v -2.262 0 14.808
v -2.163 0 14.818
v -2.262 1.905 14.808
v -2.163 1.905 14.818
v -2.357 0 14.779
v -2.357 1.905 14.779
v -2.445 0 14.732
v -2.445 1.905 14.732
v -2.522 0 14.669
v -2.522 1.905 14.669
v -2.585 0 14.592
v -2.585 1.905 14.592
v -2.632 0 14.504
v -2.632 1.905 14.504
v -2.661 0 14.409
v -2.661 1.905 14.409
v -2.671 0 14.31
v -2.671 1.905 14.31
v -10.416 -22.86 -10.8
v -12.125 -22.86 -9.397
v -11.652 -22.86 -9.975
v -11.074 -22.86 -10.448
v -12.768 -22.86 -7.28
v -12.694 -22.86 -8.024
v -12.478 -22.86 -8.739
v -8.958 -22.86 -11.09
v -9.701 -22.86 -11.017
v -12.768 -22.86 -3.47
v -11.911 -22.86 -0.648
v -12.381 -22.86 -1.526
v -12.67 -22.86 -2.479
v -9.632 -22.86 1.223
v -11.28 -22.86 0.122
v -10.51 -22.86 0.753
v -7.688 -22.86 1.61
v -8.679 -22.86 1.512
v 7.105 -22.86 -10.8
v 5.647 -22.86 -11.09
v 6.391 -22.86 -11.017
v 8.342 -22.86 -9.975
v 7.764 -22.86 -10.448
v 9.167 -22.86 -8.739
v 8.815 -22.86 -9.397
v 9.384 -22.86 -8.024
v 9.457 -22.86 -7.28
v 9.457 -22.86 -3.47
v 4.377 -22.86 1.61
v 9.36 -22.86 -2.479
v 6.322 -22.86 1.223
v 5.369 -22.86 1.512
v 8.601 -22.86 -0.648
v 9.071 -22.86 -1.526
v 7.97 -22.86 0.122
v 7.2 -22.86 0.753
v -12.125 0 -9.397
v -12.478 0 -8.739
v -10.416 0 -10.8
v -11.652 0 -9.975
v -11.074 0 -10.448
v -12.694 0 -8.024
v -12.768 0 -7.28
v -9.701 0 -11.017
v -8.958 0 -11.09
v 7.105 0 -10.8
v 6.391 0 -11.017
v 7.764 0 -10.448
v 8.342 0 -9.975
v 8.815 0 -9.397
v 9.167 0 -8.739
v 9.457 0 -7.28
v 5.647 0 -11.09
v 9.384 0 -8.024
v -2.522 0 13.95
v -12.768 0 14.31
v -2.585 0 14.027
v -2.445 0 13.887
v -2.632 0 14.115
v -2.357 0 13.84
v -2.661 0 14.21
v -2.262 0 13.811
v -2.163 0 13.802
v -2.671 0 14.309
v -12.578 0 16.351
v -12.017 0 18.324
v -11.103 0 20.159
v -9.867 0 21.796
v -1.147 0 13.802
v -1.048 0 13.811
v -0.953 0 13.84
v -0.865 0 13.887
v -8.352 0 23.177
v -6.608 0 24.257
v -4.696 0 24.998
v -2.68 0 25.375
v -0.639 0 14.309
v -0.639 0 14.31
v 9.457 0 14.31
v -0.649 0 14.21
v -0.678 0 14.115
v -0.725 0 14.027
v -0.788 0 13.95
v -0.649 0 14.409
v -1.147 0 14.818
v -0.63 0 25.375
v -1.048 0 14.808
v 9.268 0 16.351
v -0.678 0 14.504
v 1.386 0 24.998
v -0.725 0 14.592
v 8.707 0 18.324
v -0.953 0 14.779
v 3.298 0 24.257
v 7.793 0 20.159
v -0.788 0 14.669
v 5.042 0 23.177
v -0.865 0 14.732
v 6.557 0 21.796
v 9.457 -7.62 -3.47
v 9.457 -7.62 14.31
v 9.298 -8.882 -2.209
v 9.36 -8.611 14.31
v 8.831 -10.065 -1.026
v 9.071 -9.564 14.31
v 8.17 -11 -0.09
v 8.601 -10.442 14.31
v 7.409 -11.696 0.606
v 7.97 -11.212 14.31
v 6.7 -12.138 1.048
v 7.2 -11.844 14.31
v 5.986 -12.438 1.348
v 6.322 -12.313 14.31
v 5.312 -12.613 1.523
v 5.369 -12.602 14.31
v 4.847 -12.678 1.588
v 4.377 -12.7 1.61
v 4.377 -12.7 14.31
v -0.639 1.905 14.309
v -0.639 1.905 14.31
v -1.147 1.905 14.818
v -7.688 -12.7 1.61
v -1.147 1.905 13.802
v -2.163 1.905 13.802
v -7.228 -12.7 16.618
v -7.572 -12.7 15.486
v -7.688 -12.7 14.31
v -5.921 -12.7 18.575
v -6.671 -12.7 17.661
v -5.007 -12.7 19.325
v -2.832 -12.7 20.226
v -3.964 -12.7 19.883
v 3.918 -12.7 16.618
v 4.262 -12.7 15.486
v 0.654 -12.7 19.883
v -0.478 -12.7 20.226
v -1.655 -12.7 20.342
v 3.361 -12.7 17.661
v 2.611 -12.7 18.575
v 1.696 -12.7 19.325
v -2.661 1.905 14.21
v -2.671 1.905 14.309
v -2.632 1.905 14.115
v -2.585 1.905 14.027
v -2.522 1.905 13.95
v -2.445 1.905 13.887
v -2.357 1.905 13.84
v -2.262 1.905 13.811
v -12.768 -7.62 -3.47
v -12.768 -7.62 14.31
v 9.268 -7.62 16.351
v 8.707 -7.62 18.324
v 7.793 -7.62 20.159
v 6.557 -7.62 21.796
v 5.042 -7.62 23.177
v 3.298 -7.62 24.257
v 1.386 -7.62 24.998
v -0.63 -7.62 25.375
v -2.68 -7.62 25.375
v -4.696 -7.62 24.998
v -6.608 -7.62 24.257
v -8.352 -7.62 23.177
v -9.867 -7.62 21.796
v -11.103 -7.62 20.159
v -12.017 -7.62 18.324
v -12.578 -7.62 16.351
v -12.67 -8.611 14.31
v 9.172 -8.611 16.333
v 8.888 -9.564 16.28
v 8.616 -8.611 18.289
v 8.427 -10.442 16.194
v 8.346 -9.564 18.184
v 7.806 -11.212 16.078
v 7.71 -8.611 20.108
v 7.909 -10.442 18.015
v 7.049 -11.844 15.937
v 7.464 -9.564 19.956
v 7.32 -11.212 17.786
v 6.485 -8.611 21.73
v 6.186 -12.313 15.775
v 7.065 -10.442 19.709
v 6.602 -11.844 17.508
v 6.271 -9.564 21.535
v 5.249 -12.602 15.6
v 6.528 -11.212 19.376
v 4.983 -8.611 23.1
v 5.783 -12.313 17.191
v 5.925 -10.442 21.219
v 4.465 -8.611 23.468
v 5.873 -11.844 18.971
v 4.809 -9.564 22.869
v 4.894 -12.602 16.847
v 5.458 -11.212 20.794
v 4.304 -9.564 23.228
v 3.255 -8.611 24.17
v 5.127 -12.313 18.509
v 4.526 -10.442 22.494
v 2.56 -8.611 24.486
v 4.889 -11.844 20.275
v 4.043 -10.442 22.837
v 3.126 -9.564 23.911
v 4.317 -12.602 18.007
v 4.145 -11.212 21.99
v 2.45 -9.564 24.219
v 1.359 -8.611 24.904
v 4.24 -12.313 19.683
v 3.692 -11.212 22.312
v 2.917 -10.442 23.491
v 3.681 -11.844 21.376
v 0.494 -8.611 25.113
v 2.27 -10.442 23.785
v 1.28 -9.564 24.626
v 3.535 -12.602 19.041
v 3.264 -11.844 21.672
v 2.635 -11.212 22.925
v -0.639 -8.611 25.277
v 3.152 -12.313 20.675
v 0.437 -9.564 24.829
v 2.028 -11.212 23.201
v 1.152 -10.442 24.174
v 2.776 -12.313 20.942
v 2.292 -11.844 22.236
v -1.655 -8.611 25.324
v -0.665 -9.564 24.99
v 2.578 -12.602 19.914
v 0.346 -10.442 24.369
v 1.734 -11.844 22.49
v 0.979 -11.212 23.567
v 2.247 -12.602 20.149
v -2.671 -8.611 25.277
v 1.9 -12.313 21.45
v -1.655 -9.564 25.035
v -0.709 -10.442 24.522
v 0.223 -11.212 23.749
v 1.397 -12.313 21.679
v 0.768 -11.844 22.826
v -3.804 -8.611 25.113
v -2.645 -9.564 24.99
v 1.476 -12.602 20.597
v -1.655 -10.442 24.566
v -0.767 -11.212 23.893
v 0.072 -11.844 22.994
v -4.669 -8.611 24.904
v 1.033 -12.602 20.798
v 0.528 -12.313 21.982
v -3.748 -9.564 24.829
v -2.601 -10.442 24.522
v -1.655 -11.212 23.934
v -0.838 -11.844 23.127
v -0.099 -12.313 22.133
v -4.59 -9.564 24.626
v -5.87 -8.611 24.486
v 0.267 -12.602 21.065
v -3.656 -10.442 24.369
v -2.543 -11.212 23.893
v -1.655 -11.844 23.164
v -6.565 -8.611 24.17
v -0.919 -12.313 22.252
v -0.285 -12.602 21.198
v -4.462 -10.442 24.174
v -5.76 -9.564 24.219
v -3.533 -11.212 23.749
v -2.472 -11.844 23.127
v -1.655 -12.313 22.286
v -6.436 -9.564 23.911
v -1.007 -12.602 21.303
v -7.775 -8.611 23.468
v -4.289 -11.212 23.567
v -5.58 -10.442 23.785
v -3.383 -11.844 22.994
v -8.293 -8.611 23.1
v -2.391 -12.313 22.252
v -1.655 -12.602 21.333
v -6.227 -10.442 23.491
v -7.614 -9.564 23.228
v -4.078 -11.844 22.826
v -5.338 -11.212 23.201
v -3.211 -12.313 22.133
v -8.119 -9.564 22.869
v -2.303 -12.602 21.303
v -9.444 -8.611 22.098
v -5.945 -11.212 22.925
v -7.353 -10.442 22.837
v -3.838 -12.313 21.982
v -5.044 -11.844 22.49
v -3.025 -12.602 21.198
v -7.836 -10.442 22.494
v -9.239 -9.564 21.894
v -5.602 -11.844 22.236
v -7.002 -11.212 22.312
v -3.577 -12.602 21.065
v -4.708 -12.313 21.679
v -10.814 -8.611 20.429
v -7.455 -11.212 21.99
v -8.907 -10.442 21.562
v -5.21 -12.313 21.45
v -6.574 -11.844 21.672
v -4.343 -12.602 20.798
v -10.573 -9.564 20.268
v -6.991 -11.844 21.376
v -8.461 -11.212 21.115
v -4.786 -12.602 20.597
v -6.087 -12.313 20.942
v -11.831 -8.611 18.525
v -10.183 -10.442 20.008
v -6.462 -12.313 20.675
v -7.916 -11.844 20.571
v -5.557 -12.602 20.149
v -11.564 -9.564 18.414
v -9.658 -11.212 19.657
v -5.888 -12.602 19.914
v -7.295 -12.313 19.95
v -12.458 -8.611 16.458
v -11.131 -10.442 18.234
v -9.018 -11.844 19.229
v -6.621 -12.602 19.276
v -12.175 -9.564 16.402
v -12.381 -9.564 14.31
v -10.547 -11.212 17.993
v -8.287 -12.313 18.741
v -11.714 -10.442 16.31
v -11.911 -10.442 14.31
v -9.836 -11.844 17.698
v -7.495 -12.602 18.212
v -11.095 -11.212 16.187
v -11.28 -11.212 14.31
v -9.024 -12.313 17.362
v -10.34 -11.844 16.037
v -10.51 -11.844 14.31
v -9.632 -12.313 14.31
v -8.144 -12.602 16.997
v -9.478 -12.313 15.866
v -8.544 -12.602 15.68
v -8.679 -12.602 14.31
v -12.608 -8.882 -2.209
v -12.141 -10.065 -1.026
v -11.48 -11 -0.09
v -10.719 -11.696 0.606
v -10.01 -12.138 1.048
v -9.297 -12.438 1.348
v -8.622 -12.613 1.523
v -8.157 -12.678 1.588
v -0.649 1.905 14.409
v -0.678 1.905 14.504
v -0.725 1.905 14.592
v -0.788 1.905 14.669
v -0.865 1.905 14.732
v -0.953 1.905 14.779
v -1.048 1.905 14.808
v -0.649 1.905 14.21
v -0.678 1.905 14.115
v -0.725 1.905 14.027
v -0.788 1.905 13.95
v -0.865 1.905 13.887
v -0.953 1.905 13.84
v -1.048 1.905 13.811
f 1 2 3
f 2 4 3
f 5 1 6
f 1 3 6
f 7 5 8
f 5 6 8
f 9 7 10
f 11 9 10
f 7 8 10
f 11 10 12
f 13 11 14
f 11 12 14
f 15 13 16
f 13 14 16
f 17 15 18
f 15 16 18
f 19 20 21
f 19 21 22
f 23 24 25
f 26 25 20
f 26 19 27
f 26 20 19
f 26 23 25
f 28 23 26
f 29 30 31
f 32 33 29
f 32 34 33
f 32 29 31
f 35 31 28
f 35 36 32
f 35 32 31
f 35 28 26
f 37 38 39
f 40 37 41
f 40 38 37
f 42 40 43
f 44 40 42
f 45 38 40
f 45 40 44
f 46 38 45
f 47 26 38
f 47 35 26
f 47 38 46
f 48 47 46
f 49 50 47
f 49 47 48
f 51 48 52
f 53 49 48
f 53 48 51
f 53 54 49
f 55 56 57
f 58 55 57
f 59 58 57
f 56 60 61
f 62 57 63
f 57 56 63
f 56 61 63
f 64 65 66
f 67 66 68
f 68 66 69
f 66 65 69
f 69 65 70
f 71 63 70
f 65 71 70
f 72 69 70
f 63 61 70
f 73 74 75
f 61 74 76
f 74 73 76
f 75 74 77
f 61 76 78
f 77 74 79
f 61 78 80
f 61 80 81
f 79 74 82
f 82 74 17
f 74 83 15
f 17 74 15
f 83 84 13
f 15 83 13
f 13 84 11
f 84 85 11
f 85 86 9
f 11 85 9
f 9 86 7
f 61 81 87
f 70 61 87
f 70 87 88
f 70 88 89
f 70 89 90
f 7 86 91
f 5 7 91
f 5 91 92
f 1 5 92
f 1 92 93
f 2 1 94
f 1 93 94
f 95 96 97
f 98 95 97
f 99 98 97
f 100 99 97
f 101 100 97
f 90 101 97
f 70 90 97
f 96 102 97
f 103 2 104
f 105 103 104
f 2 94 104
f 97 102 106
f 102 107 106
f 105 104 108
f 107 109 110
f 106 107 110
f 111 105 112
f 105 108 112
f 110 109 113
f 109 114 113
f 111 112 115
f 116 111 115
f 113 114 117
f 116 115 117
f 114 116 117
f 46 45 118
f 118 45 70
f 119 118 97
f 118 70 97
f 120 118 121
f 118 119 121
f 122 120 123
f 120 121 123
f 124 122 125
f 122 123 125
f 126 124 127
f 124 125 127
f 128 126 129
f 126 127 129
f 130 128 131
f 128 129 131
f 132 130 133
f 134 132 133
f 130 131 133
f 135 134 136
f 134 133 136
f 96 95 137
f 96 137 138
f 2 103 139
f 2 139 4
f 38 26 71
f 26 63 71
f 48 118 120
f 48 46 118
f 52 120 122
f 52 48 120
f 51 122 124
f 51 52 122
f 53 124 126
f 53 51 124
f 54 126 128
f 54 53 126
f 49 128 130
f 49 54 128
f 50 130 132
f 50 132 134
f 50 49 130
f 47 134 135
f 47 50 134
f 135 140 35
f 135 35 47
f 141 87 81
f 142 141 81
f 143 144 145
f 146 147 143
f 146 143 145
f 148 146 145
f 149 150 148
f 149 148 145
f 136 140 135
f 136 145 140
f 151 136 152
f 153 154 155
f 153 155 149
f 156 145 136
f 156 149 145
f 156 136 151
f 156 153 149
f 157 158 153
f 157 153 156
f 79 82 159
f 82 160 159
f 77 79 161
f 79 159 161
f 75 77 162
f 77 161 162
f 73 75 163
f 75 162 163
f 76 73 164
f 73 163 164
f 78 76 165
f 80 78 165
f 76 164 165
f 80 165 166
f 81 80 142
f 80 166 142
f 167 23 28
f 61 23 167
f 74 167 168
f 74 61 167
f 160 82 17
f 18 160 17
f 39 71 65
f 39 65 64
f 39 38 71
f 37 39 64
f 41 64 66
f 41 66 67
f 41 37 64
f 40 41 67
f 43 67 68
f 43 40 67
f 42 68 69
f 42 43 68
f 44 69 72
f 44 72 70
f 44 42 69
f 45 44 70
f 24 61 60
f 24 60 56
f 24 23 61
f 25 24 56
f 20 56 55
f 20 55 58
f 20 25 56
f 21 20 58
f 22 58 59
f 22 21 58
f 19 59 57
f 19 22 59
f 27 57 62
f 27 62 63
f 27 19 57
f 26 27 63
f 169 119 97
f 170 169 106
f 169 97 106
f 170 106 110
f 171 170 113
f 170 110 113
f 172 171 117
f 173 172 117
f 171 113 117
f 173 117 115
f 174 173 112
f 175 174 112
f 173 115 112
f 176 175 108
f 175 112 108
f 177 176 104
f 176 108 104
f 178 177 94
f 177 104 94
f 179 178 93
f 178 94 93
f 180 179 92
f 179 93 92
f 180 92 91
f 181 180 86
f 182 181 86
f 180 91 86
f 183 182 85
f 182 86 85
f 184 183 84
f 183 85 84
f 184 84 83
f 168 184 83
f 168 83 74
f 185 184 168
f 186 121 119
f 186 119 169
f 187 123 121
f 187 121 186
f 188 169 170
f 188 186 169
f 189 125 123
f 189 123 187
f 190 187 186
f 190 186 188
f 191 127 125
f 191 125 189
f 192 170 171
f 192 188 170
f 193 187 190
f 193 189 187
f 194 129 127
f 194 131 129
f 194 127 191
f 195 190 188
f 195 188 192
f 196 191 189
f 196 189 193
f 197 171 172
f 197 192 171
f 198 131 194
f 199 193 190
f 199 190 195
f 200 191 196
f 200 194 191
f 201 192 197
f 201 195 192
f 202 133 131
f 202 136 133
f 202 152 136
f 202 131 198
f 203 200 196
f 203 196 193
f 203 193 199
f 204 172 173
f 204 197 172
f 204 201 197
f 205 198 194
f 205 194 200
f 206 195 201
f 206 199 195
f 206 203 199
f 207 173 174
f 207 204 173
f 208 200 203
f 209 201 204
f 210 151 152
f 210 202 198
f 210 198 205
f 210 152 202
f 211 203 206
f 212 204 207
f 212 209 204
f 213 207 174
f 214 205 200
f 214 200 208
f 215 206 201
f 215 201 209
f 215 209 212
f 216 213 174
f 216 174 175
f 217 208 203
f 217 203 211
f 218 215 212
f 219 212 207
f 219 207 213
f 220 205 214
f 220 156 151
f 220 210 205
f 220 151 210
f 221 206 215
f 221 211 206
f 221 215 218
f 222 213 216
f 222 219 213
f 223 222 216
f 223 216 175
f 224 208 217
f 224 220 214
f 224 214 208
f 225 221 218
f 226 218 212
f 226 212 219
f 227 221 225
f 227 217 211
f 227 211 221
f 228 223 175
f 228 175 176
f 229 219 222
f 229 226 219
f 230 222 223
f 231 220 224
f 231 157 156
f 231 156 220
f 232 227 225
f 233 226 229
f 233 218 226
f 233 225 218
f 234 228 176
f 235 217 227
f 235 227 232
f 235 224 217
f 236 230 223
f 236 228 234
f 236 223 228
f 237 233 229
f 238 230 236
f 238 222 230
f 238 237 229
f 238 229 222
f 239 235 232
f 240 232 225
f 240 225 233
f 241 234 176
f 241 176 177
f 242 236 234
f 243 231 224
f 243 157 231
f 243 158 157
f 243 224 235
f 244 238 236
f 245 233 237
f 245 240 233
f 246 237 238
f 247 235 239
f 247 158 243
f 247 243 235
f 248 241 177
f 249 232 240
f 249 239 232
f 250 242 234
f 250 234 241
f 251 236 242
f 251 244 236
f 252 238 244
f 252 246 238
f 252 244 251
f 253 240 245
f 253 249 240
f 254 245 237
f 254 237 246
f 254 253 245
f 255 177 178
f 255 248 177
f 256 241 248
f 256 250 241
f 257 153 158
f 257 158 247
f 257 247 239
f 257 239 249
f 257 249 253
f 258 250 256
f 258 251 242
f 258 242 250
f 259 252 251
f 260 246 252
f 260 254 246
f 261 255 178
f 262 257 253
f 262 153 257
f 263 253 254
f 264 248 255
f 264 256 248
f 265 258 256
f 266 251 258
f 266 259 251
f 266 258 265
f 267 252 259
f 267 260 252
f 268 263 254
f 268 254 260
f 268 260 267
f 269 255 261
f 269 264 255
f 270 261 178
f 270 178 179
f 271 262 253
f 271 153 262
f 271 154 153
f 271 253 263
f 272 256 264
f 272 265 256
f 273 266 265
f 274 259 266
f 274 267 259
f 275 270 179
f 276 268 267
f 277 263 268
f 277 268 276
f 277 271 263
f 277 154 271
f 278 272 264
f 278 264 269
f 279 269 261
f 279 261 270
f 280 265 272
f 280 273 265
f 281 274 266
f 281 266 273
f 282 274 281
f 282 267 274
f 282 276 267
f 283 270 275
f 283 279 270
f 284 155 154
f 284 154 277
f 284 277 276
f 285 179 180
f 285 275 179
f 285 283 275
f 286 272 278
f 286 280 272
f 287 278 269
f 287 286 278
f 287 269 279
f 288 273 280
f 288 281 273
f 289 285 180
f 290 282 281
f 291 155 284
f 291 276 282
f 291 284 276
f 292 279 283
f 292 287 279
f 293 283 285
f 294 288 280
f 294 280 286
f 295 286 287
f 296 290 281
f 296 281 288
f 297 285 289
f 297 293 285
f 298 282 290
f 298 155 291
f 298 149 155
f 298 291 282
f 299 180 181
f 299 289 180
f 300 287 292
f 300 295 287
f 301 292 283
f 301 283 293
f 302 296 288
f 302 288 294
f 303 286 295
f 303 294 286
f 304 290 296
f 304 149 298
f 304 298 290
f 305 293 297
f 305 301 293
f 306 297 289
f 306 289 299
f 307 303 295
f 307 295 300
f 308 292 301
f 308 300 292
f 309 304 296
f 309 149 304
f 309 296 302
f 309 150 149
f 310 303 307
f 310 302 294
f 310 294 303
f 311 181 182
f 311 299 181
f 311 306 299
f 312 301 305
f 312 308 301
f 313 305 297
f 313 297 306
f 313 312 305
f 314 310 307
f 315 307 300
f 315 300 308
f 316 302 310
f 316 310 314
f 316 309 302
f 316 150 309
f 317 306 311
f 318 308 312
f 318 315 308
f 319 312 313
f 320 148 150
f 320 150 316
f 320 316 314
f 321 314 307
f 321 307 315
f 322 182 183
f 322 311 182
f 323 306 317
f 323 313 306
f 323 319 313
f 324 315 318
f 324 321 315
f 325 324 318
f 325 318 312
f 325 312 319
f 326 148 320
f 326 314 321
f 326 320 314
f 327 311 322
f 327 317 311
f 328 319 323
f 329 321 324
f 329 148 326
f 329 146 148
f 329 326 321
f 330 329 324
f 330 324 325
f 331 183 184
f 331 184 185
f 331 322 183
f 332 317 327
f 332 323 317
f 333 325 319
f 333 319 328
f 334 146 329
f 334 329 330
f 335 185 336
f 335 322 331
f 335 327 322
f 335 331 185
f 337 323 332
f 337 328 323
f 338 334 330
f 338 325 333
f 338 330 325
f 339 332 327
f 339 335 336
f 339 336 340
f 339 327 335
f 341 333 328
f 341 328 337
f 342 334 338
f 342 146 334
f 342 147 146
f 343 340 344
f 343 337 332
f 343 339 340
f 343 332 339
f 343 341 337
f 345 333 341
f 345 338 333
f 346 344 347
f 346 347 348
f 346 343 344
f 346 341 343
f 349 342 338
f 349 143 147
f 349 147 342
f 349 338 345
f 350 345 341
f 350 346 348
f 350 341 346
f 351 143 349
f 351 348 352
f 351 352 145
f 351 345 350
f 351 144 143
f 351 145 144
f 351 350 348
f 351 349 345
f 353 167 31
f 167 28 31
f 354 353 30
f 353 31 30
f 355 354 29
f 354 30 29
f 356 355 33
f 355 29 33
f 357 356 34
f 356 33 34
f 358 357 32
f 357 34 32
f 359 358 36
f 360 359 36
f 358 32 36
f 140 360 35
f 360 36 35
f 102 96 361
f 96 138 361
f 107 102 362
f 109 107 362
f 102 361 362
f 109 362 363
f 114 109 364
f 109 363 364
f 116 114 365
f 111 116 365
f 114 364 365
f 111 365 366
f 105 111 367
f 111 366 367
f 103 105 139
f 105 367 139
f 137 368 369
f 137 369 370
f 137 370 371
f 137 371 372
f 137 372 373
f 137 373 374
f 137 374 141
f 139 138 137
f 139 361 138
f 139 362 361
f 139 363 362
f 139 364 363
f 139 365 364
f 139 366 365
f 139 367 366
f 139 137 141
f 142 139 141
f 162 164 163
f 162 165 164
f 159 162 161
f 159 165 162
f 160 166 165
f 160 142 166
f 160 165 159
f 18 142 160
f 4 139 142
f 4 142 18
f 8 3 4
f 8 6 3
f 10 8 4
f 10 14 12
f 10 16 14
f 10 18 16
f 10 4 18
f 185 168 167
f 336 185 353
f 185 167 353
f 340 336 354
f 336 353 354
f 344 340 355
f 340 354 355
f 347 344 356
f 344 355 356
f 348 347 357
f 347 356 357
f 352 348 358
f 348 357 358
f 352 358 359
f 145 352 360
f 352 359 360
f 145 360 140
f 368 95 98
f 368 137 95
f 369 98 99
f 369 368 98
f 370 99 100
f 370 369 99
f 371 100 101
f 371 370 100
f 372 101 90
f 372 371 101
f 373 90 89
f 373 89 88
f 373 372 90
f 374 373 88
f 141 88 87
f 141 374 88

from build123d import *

# Parameters (mm, degrees)
F1_DEPTH = 12.7
F2_W     = 22.225
F2_H     = 12.7
F3_DEPTH = 10.16
F4_R     = 5.08
F5_R     = 3.81
F6_W     = 2.032
F6_H     = 1.016
F7_DEPTH = 1.905
F8_R     = 0.50799


# Not quite as in the source:
# - a fillet or chamfer is up to 0.001 mm smaller than in the source, because OpenCascade refuses the exact size


with BuildPart() as f1:
    # F0 (on Front) → F1 (new body)
    with BuildSketch(Plane.XZ):
        with BuildLine():
            Line((-12.7675240695, 14.3095031442), (-12.7675240695, -11.0904968558))
            Line((-12.7675240695, -11.0904968558), (9.4574759305, -11.0904968558))
            Line((9.4574759305, -11.0904968558), (9.4574759305, 14.3095031442))
            ThreePointArc((9.4574759305, 14.3095031442), (-1.6550240695, 3.1970031442), (-12.7675240695, 14.3095031442))
        make_face()
        with BuildLine():
            ThreePointArc((9.4574759305, 14.3095031442), (-1.6550240695, 25.4220031442), (-12.7675240695, 14.3095031442))
            ThreePointArc((-12.7675240695, 14.3095031442), (-1.6550240695, 3.1970031442), (9.4574759305, 14.3095031442))
        make_face()
    extrude(amount=F1_DEPTH)

    # F2 (on face) → F3 (join)
    with BuildSketch(Plane.XZ.offset(12.7)):
        with Locations((-1.6550240695, -4.7404968558)):
            Rectangle(F2_W, F2_H)
    extrude(amount=F3_DEPTH)

    # F4
    f4_edges = [f1.edges().sort_by_distance(p)[0] for p in [
        (9.457476, -12.7, 7.959503),
        (-12.767524, -17.78, 1.609503),
        (9.457476, -17.78, 1.609503),
    ]]
    fillet(f4_edges, radius=F4_R)

    # F5
    f5_edges = [f1.edges().sort_by_distance(p)[0] for p in [
        (-12.767524, -11.43, -11.090497),
        (9.457476, -11.43, -11.090497),
    ]]
    fillet(f5_edges, radius=F5_R)

    # F6 (on face) → F7 (join)
    with BuildSketch(Plane(origin=(0, 0, 0), x_dir=(-1, 0, 0), z_dir=(0, 1, 0))):
        with Locations((1.6550240695, 14.3095031442)):
            Rectangle(F6_W, F6_H)
    extrude(amount=F7_DEPTH)

    # F8 (radius 0.508 in the source; OpenCascade refuses exactly that, so slightly less here)
    f8_edges = [f1.edges().sort_by_distance(p)[0] for p in [
        (-0.639024, 0.9525, 14.817503),
        (-0.639024, 0.9525, 13.801503),
        (-2.671024, 0.9525, 13.801503),
        (-2.671024, 0.9525, 14.817503),
    ]]
    fillet(f8_edges, radius=F8_R)


solid = f1.part
